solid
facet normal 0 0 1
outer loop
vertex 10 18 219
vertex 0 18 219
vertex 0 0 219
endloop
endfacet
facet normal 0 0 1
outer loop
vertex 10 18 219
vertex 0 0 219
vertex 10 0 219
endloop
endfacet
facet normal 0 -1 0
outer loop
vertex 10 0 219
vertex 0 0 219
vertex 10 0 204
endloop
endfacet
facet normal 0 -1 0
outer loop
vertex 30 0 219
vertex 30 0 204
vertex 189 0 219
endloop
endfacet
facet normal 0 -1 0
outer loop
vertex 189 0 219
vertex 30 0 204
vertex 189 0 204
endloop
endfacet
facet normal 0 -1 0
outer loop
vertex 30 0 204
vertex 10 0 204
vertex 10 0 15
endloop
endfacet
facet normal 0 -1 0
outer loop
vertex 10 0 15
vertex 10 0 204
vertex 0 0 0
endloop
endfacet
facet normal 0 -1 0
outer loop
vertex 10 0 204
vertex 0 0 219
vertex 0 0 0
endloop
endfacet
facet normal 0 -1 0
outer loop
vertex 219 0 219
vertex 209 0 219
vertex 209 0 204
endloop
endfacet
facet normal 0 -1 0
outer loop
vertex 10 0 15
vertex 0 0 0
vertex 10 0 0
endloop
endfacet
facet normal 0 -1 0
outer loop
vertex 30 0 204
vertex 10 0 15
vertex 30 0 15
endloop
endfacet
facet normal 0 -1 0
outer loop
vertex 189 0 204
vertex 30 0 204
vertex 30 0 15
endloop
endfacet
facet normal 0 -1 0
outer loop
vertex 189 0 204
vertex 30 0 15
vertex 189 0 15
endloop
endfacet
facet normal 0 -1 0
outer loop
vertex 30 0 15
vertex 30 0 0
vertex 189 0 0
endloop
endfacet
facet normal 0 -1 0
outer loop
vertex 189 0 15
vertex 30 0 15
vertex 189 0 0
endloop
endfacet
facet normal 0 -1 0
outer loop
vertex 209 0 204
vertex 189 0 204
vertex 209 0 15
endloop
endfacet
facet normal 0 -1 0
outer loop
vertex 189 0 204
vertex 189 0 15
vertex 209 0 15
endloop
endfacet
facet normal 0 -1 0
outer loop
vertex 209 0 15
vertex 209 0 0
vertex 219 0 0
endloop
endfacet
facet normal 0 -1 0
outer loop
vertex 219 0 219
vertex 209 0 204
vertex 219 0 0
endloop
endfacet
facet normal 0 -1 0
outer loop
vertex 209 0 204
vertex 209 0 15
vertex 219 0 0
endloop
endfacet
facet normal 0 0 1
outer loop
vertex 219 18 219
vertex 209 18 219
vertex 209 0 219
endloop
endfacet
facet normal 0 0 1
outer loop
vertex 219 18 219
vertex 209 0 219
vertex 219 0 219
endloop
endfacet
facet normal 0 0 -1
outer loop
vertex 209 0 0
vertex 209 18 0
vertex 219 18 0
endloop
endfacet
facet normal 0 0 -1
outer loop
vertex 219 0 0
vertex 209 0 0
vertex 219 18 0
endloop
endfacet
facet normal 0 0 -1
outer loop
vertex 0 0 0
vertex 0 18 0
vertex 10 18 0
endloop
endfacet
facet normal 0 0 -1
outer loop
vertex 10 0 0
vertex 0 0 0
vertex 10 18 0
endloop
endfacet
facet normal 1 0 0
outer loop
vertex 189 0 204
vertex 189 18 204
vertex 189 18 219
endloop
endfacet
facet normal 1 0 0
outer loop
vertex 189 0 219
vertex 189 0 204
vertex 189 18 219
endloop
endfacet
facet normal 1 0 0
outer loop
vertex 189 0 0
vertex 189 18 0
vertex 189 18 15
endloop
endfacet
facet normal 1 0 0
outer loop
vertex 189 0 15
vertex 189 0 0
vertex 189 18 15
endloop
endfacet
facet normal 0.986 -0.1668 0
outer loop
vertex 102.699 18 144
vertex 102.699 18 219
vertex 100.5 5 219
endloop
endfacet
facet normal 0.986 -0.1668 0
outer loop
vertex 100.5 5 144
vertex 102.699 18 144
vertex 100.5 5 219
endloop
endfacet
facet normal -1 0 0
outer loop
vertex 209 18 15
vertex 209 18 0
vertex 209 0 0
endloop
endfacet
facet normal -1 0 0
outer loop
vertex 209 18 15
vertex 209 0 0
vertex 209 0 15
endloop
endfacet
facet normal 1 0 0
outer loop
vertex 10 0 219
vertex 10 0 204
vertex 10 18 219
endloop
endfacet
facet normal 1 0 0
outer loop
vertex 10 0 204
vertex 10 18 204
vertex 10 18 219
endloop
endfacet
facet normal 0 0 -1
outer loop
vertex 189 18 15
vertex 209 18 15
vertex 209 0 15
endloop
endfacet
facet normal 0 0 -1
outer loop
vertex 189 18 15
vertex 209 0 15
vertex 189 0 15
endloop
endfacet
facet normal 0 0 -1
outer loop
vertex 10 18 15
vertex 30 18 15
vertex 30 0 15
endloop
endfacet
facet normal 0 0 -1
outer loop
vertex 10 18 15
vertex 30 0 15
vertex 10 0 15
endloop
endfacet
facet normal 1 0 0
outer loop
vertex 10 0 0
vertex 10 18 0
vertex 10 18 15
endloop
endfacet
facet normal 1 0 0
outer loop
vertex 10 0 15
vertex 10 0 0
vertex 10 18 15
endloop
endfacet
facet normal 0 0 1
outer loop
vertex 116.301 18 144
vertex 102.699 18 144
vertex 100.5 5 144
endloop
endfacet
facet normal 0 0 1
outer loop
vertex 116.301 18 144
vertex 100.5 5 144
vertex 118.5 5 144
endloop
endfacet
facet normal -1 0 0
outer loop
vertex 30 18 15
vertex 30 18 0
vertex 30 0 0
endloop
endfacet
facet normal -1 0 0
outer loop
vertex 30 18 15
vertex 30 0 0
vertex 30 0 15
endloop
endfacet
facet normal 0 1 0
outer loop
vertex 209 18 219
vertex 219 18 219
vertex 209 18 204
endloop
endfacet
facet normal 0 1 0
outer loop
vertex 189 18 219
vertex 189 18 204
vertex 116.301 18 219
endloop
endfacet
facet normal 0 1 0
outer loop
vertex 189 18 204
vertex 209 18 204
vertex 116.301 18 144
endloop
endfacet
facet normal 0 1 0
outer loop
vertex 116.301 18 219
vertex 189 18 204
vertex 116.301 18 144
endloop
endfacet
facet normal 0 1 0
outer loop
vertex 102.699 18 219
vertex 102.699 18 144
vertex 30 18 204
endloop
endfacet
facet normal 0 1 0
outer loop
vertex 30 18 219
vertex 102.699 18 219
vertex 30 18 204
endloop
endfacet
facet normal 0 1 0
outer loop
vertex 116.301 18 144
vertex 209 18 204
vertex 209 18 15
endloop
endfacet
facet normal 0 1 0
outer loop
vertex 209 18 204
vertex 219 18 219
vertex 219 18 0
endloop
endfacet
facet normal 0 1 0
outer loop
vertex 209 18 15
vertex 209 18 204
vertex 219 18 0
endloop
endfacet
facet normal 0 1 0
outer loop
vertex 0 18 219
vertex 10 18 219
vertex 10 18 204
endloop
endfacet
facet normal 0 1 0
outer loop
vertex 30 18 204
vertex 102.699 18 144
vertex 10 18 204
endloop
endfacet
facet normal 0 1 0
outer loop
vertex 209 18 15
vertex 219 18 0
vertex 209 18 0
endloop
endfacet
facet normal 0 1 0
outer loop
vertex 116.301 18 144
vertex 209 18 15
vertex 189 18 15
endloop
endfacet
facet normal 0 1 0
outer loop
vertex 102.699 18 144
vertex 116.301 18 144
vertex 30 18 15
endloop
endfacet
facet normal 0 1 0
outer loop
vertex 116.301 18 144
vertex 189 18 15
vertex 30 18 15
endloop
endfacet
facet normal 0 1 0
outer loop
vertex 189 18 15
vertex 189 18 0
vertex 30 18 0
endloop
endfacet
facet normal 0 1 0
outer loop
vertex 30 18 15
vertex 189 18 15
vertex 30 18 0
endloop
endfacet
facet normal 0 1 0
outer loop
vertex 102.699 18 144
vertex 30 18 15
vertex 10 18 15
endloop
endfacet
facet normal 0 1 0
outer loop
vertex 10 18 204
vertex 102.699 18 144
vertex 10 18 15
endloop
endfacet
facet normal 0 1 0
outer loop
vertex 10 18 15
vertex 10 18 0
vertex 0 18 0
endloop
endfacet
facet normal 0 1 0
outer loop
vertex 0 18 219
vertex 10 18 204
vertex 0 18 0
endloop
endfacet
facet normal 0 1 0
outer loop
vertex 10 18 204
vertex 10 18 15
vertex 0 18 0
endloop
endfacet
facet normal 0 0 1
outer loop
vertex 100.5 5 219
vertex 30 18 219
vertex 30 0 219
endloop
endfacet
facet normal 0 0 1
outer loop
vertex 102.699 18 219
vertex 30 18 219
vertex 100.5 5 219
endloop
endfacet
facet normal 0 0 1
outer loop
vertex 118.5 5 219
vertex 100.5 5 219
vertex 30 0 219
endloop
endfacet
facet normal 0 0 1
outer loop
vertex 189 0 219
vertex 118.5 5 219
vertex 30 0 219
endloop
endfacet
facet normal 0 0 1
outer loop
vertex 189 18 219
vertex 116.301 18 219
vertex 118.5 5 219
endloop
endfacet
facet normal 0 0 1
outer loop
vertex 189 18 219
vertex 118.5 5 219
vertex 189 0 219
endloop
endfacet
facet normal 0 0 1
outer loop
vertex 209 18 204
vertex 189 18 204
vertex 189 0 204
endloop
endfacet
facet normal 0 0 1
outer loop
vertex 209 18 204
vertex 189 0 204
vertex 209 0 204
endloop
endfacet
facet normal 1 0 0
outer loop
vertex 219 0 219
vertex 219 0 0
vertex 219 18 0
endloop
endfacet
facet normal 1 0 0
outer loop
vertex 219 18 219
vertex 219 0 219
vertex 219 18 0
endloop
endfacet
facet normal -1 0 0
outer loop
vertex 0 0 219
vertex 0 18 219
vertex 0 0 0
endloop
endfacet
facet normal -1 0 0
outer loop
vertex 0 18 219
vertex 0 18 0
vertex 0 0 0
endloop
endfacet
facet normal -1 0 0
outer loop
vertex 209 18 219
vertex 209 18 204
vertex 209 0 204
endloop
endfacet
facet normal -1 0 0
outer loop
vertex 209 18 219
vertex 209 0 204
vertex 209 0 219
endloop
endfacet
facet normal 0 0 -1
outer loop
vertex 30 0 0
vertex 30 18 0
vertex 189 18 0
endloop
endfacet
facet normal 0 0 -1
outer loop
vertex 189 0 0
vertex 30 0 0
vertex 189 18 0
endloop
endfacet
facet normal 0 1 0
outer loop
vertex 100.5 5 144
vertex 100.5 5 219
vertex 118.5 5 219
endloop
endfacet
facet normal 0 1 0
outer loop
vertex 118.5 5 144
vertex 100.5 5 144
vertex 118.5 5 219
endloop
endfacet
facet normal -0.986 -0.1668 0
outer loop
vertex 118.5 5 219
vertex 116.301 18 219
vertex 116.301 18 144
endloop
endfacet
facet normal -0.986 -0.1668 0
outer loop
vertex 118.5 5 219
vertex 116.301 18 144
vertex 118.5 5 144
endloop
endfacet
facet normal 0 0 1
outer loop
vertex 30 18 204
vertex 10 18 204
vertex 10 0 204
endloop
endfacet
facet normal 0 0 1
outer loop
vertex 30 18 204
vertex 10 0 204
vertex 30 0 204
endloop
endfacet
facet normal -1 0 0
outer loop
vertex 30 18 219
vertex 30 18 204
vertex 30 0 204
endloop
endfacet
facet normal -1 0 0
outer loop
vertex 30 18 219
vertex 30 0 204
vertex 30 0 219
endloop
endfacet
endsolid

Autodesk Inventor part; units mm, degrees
ref_plane "YZ Plane" through (0, 0, 0) normal (1, 0, 0) x (0, 1, 0)
ref_plane "XZ Plane" through (0, 0, 0) normal (0, 1, 0) x (-1, 0, 0)
ref_plane "XY Plane" through (0, 0, 0) normal (0, 0, 1) x (1, 0, 0)
sketch "Sketch1" plane through (0, 0, 0) normal (0, 0, 1) x (1, 0, 0)
  line L0 (0, 0) -> (219, 0)
  line L1 (219, 0) -> (219, 18)
  line L2 (219, 18) -> (0, 18)
  line L3 (0, 18) -> (0, 0)
  dimension "d0" = 219
  dimension "d1" = 18
extrude "Extrusion1" add sketch "Sketch1" along normal blind 219
sketch "Sketch2" plane through (0, 0, 219) normal (0, 0, 1) x (1, 0, 0)
  line L0 (102.6988, 18) -> (100.5, 5)
  line L1 (100.5, 5) -> (118.5, 5)
  line L2 (0, 0) -> (219, 0) projected
  line L3 (219, 18) -> (0, 18) projected
  line L4 (102.6988, 18) -> (102.6988, 9.1069) construction
  line L5 (109.5, -2.3259) -> (109.5, -4.6671) construction
  line L6 (116.3012, 18) -> (118.5, 5)
  point P0 (109.5, 5)
  point P1 (109.5, 0)
  point P2 (109.5, -3.4965)
  point P3 (109.5, 0)
  dimension "d4" = 5
  dimension "d5" = 9.6
  dimension "d6" = 18
extrude "Extrusion2" cut sketch "Sketch2" against normal blind 75
sketch "Sketch3" plane through (0, 18, 0) normal (0, 1, 0) x (1, 0, 0)
  line L0 (10, -204) -> (30, -204)
  line L1 (0, 0) -> (0, -219) projected
  line L2 (20, -205.0009) -> (20, -197.8859) construction
  line L3 (102.6988, -219) -> (0, -219) construction
  line L4 (10, -204) -> (10, -219)
  line L5 (30, -204) -> (30, -219)
  line L6 (30, -219) -> (10, -219)
  point P0 (20, -204)
  dimension "d17" = 20
  dimension "d18" = 15
  dimension "d19" = 10
extrude "Extrusion3" cut sketch "Sketch3" against normal through all
pattern_linear "Rectangular Pattern1" count 2 spacing -204 along (0, 0, 1) count 2 spacing 179 along (1, 0, 0) of "Extrusion3"
properties part number "TNS-1-platform"
